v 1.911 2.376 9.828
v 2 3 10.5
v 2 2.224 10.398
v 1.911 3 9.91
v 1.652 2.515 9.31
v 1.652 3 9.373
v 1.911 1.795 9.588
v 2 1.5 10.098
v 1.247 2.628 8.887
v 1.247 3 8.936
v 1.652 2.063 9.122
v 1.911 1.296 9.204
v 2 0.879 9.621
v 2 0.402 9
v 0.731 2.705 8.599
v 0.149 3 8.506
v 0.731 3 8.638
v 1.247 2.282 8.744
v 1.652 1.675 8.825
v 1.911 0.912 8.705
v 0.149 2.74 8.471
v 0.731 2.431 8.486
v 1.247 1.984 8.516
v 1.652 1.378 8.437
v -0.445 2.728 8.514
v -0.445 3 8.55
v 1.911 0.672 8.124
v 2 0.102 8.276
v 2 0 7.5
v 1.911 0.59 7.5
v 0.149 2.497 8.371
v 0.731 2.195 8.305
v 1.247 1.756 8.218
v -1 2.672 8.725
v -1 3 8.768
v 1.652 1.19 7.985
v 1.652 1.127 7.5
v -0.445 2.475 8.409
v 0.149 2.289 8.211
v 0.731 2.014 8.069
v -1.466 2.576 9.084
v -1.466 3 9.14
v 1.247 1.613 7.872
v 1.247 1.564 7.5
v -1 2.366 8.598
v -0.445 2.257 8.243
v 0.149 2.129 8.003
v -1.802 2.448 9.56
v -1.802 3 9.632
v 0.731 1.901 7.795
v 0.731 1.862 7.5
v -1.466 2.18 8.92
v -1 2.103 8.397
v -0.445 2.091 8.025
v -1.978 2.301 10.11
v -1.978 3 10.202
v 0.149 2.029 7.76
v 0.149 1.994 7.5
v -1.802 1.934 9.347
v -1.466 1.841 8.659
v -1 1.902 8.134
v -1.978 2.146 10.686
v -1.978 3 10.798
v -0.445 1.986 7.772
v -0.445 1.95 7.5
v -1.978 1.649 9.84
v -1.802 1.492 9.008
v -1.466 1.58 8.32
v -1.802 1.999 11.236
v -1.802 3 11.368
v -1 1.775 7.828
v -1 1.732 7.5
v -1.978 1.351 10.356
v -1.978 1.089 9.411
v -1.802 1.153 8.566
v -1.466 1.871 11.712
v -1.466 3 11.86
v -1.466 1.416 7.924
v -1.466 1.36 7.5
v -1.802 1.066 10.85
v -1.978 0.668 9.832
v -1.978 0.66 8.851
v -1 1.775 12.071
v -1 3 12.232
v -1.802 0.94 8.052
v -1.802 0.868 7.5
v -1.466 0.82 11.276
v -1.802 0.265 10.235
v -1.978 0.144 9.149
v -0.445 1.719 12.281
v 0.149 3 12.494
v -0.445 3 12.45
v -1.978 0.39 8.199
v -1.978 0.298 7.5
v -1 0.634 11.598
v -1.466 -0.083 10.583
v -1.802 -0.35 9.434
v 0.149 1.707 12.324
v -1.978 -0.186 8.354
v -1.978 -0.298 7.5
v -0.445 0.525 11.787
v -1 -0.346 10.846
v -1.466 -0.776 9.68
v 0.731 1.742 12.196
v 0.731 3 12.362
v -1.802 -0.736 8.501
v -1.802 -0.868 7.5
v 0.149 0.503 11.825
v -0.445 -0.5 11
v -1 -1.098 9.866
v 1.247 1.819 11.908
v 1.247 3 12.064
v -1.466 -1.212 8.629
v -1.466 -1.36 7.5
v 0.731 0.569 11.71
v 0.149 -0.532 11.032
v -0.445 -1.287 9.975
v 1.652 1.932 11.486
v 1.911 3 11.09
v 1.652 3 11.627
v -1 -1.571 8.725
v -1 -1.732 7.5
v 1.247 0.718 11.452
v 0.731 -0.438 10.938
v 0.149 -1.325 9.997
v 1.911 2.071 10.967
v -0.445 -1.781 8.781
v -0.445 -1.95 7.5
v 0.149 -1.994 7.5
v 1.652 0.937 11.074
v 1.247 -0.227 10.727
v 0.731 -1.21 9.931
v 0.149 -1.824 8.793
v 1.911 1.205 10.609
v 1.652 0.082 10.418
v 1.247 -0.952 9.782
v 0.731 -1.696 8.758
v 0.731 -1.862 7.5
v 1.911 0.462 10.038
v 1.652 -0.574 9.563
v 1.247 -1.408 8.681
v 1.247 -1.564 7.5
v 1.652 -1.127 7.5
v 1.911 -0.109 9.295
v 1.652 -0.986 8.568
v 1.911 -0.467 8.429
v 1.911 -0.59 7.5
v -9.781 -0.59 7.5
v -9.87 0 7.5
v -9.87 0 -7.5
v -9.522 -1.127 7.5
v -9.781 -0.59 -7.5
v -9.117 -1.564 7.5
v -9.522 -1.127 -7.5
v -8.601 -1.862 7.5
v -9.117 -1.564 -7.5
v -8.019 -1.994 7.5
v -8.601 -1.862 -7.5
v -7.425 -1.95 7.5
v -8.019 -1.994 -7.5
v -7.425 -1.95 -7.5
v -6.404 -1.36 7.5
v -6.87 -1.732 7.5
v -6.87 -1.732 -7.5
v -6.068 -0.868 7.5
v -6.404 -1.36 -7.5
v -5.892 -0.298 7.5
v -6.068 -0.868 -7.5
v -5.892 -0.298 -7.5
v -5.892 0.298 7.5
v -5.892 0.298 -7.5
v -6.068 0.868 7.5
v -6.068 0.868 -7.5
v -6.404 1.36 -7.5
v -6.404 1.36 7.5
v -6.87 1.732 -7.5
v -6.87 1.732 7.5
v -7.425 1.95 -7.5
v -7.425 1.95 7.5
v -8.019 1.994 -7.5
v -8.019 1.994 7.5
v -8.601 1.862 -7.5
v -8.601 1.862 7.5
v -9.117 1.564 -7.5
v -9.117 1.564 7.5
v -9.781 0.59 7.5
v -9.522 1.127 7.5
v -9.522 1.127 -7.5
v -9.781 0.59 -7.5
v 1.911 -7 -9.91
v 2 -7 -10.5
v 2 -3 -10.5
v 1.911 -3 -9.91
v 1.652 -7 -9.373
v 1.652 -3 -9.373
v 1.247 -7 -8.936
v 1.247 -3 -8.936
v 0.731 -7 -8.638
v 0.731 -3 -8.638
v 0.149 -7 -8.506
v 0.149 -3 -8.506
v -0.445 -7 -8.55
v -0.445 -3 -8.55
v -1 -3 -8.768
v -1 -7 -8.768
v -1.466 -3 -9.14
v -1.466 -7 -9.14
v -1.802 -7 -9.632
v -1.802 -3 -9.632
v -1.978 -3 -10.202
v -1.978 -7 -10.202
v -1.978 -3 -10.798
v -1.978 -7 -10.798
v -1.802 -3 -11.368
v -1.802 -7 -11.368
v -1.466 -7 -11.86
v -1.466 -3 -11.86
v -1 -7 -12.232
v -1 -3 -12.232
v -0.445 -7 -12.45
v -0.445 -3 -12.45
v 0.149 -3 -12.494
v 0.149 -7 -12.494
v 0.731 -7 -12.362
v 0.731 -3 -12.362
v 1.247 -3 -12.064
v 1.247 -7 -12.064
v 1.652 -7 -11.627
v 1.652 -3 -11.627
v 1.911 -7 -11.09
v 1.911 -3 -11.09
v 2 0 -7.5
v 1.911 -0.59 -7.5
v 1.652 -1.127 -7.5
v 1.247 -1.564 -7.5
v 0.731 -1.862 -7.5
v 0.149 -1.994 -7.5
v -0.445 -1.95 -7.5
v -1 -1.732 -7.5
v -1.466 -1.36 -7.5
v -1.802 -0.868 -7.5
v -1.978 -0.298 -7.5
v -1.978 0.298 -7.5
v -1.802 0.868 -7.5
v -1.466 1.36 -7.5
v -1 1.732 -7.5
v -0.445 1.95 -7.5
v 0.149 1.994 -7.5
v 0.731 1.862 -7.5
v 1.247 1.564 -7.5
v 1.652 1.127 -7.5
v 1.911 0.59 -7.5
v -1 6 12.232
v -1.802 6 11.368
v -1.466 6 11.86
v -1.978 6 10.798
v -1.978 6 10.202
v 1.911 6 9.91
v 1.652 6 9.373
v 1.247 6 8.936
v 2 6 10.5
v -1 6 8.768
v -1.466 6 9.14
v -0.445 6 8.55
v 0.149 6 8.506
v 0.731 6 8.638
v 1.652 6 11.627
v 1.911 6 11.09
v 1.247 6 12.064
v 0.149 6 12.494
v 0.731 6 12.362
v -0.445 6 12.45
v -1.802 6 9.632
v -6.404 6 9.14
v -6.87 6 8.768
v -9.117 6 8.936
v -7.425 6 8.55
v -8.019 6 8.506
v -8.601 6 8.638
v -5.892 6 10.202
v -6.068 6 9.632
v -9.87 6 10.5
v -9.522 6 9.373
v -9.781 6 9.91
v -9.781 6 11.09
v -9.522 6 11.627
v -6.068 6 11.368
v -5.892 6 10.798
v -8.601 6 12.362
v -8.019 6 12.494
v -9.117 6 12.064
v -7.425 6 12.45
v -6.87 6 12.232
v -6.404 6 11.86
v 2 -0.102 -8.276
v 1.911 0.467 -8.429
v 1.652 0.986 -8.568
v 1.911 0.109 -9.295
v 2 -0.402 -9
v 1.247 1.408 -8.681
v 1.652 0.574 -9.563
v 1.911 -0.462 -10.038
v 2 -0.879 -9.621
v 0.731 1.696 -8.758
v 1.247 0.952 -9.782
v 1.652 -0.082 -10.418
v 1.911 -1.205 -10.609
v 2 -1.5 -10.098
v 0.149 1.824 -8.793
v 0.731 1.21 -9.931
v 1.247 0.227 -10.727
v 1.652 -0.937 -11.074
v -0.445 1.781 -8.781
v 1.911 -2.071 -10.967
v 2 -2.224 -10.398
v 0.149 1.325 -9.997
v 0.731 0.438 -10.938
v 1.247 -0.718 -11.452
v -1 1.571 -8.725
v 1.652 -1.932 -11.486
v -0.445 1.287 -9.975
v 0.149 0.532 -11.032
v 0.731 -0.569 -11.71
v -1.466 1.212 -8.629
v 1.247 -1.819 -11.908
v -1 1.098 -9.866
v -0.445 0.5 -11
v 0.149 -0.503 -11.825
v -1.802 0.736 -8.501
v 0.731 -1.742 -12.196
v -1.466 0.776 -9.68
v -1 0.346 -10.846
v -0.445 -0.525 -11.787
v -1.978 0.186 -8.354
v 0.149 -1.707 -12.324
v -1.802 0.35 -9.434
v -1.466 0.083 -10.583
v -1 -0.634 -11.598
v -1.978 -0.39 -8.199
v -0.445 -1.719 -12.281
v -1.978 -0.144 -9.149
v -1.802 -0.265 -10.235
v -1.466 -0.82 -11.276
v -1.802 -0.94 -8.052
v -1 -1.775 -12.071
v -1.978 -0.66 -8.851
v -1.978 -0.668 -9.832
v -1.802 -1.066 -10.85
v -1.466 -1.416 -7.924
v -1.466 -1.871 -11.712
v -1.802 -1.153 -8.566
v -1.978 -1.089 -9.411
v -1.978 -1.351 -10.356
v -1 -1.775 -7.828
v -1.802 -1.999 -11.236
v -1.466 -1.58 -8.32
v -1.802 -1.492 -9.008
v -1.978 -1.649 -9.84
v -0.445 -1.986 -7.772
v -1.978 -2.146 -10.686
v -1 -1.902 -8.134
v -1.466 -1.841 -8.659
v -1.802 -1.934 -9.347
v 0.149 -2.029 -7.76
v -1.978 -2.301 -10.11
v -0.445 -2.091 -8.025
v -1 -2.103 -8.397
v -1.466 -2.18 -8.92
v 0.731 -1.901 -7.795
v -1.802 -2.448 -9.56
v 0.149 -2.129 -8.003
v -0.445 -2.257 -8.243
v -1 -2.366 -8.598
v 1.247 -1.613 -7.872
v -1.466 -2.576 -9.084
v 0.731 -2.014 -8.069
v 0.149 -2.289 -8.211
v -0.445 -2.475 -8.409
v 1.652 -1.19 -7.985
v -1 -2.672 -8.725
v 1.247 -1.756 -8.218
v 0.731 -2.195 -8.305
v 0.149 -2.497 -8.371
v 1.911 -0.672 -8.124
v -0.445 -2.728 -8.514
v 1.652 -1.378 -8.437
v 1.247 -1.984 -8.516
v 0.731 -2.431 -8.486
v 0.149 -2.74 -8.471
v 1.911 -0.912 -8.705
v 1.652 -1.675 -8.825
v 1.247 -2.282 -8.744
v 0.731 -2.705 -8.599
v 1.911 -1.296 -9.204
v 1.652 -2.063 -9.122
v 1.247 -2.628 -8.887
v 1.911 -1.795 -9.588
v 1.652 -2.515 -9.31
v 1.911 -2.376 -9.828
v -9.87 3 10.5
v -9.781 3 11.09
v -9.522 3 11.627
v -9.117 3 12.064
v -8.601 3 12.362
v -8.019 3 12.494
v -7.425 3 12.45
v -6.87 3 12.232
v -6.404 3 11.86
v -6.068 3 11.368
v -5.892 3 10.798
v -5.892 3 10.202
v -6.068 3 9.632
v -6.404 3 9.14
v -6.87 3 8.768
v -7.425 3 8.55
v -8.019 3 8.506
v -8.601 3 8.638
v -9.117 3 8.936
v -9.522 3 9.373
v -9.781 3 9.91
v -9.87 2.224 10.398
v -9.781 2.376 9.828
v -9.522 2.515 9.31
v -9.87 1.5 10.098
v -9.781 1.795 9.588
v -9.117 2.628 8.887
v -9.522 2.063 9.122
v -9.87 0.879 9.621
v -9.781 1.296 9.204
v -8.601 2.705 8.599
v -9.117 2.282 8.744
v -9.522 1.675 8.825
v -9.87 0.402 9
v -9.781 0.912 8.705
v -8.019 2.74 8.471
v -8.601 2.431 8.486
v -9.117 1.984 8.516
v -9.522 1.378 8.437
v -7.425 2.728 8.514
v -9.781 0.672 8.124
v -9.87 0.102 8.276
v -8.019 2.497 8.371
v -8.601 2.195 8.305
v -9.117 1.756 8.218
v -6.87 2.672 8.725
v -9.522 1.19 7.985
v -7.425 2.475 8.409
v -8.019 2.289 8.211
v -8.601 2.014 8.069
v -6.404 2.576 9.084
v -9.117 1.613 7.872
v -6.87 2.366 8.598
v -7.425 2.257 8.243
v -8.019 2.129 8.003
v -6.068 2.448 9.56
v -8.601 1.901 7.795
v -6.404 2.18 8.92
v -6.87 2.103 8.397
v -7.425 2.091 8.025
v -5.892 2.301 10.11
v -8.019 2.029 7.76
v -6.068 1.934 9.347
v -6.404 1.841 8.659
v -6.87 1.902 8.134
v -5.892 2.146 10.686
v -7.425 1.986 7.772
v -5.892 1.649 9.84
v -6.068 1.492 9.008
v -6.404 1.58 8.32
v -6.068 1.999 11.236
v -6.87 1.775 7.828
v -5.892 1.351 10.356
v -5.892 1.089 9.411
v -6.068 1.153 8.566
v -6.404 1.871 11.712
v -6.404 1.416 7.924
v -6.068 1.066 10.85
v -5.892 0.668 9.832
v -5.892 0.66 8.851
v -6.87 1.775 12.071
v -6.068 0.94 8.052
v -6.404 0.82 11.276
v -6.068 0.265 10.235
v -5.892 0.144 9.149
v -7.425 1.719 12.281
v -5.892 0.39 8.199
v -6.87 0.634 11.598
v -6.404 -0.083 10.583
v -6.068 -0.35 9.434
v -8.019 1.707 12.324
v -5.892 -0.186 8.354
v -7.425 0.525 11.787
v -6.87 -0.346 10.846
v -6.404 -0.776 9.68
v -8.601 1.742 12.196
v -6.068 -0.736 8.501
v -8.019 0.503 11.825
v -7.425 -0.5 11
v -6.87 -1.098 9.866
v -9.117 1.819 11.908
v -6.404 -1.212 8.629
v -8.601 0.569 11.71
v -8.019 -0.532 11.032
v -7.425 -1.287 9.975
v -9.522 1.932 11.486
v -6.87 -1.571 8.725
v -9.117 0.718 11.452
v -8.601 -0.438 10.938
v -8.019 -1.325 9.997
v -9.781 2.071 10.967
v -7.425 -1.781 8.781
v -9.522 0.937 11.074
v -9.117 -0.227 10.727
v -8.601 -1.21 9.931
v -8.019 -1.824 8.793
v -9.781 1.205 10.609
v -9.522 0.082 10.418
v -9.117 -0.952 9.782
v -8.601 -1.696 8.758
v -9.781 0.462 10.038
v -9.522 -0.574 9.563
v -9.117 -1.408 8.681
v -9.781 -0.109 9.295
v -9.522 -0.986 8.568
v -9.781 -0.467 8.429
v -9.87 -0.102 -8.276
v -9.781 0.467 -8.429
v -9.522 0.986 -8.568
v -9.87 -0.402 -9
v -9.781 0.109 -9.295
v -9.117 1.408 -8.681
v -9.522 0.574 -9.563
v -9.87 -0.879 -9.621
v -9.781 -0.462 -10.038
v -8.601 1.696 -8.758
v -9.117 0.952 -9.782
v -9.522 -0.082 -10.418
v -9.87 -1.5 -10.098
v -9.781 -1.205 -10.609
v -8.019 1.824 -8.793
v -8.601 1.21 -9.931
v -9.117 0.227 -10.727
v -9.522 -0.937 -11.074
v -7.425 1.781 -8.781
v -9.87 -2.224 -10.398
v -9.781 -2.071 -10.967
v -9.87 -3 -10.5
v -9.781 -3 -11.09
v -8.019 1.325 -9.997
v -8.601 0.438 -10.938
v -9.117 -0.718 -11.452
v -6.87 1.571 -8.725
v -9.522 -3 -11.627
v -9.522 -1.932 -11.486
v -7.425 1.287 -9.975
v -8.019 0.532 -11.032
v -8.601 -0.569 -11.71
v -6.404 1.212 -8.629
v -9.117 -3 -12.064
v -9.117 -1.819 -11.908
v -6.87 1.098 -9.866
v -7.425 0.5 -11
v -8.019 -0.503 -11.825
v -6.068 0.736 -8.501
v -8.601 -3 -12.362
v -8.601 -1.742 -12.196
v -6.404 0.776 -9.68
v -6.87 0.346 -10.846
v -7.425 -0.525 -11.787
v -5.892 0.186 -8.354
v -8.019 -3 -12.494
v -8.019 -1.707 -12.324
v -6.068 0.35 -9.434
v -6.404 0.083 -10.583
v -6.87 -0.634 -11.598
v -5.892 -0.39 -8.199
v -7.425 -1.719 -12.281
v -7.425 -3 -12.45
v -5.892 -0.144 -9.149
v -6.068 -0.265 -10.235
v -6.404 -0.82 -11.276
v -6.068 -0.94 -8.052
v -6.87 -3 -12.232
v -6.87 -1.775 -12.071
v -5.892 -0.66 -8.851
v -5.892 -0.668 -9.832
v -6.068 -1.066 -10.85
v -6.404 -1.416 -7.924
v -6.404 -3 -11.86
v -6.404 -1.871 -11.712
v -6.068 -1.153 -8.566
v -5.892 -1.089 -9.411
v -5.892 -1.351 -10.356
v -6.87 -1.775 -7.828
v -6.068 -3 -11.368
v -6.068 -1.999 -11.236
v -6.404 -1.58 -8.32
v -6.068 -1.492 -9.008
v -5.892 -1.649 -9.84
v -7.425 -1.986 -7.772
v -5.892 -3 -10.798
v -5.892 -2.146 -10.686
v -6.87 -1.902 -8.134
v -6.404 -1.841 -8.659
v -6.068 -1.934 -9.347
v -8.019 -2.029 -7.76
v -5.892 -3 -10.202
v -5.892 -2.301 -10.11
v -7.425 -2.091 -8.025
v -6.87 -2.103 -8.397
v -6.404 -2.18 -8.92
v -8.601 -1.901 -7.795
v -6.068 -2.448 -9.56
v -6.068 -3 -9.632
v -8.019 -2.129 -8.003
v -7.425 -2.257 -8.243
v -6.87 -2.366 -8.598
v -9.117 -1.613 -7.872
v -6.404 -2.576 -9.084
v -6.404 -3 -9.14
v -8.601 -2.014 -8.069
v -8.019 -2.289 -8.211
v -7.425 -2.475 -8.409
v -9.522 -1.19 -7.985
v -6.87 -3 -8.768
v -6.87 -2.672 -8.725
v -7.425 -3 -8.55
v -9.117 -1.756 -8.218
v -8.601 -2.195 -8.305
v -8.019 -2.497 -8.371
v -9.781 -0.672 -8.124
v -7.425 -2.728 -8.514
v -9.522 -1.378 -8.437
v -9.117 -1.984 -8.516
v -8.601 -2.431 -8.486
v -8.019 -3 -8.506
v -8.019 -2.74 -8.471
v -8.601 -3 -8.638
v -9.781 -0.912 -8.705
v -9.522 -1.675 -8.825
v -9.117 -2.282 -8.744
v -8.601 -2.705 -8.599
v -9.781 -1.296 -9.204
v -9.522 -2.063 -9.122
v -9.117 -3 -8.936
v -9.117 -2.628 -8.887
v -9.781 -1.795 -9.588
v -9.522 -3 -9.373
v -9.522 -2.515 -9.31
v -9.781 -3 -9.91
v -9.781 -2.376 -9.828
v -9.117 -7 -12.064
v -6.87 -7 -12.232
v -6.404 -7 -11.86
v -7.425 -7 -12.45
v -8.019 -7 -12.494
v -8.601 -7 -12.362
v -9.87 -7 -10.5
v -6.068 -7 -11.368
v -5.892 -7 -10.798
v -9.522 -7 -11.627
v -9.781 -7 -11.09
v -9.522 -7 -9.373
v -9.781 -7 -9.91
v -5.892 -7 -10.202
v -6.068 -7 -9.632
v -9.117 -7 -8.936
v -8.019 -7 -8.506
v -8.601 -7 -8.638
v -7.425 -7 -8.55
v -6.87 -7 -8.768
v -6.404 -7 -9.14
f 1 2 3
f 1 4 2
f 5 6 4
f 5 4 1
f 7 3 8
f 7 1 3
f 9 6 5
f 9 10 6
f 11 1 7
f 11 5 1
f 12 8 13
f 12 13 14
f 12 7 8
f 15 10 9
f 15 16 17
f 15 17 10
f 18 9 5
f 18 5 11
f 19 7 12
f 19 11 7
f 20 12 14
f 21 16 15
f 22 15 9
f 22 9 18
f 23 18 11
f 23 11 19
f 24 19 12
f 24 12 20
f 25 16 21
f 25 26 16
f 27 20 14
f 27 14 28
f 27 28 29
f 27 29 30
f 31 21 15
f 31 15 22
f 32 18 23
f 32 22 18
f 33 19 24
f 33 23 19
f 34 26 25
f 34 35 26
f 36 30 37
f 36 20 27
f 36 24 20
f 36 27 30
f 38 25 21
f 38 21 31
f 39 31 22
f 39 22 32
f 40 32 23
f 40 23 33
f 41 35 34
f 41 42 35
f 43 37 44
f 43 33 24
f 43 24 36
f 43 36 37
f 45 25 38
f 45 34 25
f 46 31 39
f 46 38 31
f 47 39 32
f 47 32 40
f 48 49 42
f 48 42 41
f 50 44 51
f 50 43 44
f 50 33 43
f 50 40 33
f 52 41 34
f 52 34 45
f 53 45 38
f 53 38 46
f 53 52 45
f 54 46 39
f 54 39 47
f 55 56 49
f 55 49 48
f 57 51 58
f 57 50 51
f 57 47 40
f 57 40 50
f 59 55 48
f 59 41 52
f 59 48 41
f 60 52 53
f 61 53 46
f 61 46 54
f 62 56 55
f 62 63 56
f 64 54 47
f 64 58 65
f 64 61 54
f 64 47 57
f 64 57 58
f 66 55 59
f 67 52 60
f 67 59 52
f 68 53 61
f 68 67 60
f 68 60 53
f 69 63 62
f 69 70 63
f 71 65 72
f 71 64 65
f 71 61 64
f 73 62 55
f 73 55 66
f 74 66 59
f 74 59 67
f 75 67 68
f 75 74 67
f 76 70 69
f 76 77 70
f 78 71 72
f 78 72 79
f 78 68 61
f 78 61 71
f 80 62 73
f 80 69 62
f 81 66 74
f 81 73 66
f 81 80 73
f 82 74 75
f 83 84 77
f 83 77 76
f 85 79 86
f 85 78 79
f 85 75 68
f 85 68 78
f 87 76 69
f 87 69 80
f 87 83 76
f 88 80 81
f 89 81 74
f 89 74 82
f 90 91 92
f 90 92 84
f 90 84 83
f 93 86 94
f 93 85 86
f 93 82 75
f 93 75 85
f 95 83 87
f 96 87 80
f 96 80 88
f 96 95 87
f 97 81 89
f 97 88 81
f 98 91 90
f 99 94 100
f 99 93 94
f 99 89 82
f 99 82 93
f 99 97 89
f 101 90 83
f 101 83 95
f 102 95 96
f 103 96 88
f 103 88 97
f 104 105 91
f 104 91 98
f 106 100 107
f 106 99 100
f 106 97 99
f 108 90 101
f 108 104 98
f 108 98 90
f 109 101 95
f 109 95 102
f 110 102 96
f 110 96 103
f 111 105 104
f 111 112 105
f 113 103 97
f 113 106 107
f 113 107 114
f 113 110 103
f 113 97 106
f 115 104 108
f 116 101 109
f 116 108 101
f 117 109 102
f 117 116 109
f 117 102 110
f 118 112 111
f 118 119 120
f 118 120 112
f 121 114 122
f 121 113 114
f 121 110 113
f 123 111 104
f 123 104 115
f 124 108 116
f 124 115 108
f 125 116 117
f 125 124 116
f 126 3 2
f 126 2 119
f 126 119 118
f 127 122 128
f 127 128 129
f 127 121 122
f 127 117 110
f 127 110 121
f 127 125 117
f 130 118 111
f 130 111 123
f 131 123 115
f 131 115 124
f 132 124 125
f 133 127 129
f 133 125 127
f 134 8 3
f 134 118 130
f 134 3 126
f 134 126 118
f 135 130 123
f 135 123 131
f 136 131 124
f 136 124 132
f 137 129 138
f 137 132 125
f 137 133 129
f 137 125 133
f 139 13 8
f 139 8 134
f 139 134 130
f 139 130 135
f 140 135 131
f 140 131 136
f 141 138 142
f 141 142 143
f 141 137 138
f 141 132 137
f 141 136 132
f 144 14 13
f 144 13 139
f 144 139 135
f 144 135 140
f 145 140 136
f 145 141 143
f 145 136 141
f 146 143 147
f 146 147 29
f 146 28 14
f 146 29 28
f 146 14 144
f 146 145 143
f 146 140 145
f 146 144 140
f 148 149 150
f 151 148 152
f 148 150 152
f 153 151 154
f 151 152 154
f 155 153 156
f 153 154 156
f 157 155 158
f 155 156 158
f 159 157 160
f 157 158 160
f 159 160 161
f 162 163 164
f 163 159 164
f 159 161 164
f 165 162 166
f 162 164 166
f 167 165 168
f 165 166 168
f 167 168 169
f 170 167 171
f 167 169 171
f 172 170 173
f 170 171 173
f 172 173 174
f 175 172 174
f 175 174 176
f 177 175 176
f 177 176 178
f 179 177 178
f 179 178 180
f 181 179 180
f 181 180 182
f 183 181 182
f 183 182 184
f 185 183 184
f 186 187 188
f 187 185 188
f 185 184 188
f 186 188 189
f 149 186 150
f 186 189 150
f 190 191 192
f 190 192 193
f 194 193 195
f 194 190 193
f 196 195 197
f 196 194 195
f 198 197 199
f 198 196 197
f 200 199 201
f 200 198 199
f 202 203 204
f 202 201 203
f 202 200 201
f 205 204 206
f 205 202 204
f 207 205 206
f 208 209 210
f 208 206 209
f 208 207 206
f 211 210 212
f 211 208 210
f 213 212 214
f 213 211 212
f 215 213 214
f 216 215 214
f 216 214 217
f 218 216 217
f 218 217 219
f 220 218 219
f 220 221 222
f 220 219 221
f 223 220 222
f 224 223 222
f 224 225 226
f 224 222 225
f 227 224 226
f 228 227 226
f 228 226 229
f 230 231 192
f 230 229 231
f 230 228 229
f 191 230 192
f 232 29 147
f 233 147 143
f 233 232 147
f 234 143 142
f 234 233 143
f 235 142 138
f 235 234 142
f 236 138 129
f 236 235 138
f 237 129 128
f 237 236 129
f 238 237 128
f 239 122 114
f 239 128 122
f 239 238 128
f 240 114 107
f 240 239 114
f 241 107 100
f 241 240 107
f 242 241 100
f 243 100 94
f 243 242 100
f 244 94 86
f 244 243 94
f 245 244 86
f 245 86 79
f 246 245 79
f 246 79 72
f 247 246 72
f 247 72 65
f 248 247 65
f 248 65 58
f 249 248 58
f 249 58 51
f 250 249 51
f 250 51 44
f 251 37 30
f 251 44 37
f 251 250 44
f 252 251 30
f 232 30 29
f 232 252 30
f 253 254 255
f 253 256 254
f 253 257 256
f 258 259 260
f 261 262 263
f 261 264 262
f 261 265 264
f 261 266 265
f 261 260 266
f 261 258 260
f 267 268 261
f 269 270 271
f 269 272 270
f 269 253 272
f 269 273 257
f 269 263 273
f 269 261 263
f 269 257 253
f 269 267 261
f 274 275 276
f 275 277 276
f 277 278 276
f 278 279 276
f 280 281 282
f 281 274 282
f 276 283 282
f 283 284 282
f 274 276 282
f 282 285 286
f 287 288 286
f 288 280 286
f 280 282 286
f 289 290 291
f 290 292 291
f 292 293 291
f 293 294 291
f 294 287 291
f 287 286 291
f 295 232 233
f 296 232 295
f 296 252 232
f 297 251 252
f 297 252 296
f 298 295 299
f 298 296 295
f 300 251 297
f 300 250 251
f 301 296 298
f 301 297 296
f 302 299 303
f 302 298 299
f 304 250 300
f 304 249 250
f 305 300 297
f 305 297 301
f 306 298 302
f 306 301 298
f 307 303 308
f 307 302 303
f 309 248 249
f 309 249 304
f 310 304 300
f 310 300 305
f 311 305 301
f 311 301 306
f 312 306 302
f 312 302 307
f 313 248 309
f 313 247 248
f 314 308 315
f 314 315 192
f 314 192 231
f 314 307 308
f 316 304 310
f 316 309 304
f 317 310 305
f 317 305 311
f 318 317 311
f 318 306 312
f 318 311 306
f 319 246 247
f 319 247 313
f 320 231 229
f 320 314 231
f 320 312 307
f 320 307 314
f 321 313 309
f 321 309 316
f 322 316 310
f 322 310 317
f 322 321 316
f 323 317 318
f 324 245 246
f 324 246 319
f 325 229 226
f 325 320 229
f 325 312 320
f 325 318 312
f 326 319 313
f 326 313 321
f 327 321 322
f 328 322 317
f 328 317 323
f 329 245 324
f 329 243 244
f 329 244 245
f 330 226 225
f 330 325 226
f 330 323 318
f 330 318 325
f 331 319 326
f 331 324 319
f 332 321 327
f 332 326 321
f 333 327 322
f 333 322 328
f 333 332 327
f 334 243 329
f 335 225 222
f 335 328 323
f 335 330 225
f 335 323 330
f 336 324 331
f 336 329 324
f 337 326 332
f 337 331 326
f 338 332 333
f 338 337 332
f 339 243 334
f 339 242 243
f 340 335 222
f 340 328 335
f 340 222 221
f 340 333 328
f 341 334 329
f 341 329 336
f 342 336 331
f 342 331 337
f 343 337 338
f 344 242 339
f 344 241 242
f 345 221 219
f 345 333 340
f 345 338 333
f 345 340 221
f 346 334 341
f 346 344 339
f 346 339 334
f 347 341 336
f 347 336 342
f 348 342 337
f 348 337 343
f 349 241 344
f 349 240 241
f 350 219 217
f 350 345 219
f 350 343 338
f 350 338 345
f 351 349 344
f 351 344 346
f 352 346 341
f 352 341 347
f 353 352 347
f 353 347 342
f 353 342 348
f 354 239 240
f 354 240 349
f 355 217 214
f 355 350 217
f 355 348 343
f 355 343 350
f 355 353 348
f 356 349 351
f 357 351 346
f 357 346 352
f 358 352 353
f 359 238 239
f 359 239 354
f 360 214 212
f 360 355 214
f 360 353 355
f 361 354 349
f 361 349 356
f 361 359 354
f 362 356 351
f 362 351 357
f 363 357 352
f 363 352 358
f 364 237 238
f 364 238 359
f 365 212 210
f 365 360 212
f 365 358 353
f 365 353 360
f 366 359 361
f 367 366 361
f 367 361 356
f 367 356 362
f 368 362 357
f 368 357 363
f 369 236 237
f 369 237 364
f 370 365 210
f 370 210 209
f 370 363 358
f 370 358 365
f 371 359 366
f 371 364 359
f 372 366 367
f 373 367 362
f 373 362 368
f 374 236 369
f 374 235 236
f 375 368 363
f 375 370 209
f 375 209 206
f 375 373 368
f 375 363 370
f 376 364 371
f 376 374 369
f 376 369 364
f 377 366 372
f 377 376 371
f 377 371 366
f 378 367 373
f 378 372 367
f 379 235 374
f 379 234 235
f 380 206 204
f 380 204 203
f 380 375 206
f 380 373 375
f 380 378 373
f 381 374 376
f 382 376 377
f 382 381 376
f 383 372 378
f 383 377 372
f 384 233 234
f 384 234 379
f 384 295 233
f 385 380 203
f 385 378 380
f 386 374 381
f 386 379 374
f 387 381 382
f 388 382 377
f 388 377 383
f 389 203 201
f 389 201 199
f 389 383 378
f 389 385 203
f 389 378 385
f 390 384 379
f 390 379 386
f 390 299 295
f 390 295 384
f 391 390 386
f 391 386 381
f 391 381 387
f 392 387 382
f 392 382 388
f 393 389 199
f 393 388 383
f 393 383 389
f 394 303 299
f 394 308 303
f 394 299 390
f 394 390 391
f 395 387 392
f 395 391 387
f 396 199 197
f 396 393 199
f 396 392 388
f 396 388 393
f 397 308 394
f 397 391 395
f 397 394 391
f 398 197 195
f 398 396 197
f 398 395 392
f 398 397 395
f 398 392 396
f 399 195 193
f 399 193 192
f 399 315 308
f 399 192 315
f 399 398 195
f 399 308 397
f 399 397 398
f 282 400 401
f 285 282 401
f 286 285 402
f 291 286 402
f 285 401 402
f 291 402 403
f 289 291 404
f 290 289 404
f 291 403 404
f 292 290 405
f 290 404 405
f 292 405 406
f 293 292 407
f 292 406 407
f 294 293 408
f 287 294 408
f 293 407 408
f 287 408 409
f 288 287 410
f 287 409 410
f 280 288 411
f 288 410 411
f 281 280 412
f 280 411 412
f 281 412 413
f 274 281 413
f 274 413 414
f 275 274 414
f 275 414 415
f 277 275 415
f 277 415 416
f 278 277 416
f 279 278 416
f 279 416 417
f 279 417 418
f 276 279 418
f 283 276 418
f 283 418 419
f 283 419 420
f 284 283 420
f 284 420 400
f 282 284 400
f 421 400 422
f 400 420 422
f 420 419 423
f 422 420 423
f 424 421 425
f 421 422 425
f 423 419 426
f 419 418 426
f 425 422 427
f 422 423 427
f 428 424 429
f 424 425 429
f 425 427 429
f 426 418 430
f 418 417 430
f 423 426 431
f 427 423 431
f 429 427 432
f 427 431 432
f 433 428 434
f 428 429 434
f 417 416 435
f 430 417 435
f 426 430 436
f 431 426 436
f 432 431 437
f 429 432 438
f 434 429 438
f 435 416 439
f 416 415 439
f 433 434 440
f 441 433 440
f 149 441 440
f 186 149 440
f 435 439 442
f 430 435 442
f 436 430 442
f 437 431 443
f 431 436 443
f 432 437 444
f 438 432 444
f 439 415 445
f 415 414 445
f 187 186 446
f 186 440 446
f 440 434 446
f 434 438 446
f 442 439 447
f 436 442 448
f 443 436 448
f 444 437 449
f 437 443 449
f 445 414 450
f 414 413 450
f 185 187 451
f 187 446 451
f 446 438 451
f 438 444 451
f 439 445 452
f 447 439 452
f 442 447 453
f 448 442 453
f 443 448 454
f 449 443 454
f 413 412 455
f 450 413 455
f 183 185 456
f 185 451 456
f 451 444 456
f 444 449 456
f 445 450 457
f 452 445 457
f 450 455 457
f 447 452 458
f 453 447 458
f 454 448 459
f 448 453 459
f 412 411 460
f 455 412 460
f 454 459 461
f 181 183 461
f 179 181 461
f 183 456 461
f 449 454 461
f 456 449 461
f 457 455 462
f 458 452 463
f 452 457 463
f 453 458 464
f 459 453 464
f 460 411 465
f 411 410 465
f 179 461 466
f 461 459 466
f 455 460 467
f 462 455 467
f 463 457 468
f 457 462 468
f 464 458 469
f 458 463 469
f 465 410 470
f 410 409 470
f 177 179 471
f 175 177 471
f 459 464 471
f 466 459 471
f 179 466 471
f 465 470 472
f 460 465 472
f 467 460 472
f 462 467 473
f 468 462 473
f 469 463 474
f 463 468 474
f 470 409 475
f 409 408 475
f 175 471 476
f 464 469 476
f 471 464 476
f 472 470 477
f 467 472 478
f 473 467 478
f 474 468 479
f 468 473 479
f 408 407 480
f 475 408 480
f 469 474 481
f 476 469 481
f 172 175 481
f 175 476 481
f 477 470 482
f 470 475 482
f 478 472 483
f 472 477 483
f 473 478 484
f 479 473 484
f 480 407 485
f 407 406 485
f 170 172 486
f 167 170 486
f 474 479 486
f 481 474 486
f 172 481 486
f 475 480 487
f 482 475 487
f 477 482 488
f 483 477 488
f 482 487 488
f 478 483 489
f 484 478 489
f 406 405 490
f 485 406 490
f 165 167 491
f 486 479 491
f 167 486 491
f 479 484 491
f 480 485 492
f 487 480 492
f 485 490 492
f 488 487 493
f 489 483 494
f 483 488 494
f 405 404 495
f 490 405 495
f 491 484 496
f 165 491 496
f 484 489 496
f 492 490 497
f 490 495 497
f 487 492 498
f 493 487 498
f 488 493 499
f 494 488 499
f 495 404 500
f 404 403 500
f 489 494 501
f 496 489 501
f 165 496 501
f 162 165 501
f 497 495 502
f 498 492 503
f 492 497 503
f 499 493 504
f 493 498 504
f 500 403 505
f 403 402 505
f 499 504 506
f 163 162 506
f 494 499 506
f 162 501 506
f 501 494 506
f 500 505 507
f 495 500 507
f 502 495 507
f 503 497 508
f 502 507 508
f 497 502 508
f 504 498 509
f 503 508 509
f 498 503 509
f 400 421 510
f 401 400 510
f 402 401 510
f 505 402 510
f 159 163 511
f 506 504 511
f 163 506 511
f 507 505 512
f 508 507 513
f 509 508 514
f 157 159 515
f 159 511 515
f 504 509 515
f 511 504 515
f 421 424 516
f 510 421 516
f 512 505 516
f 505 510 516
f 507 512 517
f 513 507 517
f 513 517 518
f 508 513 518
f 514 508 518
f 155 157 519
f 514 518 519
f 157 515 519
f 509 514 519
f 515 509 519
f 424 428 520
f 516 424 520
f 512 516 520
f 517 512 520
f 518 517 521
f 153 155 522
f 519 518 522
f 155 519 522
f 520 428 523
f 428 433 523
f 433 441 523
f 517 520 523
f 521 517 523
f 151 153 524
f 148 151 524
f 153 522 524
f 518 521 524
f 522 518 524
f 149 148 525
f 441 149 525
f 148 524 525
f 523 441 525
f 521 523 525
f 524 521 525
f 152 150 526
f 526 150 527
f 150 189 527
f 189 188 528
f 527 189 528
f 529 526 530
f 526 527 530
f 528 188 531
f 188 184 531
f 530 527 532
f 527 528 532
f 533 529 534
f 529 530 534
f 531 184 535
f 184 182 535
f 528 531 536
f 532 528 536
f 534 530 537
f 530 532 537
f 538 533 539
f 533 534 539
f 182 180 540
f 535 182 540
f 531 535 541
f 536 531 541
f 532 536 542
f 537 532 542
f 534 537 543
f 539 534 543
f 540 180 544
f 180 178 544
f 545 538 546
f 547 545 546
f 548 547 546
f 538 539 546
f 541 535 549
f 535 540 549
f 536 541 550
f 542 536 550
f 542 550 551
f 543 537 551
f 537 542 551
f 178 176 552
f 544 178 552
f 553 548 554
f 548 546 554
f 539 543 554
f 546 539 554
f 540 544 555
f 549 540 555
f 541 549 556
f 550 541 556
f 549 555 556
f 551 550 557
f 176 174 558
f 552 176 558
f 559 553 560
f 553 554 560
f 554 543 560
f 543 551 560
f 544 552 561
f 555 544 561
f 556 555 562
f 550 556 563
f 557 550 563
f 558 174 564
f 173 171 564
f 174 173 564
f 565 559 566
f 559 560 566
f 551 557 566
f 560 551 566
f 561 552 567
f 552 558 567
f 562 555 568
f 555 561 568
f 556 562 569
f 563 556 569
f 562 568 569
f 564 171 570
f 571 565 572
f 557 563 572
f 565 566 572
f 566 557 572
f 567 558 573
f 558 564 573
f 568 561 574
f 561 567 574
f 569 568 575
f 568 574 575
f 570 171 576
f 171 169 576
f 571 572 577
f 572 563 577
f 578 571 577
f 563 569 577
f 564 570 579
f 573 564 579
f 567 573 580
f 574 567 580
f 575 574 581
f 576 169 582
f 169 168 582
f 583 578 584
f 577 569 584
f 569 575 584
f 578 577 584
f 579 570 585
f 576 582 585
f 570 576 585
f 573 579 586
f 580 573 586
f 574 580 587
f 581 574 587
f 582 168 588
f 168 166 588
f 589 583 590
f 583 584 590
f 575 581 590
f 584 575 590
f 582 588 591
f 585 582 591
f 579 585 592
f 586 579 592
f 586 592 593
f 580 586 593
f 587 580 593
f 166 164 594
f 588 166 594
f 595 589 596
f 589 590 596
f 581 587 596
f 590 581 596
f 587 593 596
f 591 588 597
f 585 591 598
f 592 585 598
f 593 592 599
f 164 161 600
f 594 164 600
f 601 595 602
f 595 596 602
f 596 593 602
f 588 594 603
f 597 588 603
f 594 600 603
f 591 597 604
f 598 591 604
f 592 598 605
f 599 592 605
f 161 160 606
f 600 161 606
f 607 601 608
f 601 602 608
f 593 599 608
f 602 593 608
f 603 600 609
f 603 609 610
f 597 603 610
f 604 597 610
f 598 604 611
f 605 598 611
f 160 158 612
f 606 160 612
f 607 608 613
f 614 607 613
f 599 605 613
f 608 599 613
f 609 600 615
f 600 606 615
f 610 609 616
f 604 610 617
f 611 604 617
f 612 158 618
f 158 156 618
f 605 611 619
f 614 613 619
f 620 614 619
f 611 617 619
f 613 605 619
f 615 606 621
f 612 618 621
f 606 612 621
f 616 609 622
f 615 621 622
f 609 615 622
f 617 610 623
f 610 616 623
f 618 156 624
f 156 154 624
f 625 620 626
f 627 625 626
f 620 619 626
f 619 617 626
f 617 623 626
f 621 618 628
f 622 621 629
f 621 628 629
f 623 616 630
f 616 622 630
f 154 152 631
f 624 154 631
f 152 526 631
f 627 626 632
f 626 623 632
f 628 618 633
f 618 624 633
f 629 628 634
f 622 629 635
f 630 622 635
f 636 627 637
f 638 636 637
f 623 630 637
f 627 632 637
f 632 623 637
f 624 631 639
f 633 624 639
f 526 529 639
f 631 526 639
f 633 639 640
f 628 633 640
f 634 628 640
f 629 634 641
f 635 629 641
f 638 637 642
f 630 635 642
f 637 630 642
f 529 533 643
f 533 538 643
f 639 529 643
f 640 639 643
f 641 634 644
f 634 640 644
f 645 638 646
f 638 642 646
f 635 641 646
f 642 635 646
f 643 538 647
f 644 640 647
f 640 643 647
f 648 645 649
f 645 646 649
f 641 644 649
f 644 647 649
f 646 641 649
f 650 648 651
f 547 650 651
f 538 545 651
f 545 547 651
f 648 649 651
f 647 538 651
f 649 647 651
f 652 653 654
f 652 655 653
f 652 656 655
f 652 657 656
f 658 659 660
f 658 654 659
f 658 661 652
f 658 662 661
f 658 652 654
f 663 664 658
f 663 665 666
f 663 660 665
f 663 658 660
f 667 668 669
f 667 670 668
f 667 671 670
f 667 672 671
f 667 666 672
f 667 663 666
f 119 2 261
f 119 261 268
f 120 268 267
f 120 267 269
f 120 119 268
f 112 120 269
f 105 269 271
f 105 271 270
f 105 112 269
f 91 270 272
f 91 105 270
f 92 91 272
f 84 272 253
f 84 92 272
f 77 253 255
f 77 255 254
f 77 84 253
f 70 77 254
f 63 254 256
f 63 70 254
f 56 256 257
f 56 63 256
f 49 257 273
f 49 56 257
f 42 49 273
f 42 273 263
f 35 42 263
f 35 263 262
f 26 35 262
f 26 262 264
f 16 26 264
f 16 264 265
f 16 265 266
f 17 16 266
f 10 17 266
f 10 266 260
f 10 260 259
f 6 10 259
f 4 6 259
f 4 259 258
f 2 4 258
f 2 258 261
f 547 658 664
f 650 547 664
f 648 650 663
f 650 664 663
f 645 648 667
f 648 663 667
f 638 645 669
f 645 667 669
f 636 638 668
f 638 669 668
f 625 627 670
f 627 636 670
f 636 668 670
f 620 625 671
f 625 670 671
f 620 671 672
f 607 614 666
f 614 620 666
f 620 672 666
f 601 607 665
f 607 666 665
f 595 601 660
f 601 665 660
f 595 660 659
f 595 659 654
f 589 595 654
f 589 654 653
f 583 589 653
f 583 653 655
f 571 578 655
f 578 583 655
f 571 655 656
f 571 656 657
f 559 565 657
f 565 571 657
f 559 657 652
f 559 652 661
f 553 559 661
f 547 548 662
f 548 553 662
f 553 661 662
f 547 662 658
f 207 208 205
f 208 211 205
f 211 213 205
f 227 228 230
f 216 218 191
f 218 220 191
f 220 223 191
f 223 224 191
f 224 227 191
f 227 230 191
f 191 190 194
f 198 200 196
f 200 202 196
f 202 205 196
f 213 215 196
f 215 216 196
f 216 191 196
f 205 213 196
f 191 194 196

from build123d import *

# Parameters (mm, degrees)
SKETCH2_R = 2


with BuildPart() as part:
    # Sweep1: sweep along a path in Sketch1
    with BuildLine(Plane(origin=(0, 0, 0), x_dir=(0, 0, -1), z_dir=(1, 0, 0))) as sweep1_path:
        Line((-10.5, 6), (-10.5, 3))
        ThreePointArc((-10.5, 3), (-9.621320344, 0.878679656), (-7.5, 0))
        Line((-7.5, 0), (7.5, 0))
        ThreePointArc((7.5, 0), (9.621320344, -0.878679656), (10.5, -3))
        Line((10.5, -3), (10.5, -7))
    # Sketch2 → Sweep1 (sweep)
    with BuildSketch(Plane(origin=(0, 6, 0), x_dir=(1, 0, 0), z_dir=(0, 1, 0))):
        with Locations((0, -10.5)):
            Circle(SKETCH2_R)
    sweep(path=sweep1_path.line)


with BuildPart() as body_2:
    # Mirror2: mirrored copy
    add(part.part.mirror(Plane(origin=(-3.935, 0, 0), x_dir=(0, 0, 1), z_dir=(1, 0, 0))))


solid = Compound([part.part, body_2.part])
